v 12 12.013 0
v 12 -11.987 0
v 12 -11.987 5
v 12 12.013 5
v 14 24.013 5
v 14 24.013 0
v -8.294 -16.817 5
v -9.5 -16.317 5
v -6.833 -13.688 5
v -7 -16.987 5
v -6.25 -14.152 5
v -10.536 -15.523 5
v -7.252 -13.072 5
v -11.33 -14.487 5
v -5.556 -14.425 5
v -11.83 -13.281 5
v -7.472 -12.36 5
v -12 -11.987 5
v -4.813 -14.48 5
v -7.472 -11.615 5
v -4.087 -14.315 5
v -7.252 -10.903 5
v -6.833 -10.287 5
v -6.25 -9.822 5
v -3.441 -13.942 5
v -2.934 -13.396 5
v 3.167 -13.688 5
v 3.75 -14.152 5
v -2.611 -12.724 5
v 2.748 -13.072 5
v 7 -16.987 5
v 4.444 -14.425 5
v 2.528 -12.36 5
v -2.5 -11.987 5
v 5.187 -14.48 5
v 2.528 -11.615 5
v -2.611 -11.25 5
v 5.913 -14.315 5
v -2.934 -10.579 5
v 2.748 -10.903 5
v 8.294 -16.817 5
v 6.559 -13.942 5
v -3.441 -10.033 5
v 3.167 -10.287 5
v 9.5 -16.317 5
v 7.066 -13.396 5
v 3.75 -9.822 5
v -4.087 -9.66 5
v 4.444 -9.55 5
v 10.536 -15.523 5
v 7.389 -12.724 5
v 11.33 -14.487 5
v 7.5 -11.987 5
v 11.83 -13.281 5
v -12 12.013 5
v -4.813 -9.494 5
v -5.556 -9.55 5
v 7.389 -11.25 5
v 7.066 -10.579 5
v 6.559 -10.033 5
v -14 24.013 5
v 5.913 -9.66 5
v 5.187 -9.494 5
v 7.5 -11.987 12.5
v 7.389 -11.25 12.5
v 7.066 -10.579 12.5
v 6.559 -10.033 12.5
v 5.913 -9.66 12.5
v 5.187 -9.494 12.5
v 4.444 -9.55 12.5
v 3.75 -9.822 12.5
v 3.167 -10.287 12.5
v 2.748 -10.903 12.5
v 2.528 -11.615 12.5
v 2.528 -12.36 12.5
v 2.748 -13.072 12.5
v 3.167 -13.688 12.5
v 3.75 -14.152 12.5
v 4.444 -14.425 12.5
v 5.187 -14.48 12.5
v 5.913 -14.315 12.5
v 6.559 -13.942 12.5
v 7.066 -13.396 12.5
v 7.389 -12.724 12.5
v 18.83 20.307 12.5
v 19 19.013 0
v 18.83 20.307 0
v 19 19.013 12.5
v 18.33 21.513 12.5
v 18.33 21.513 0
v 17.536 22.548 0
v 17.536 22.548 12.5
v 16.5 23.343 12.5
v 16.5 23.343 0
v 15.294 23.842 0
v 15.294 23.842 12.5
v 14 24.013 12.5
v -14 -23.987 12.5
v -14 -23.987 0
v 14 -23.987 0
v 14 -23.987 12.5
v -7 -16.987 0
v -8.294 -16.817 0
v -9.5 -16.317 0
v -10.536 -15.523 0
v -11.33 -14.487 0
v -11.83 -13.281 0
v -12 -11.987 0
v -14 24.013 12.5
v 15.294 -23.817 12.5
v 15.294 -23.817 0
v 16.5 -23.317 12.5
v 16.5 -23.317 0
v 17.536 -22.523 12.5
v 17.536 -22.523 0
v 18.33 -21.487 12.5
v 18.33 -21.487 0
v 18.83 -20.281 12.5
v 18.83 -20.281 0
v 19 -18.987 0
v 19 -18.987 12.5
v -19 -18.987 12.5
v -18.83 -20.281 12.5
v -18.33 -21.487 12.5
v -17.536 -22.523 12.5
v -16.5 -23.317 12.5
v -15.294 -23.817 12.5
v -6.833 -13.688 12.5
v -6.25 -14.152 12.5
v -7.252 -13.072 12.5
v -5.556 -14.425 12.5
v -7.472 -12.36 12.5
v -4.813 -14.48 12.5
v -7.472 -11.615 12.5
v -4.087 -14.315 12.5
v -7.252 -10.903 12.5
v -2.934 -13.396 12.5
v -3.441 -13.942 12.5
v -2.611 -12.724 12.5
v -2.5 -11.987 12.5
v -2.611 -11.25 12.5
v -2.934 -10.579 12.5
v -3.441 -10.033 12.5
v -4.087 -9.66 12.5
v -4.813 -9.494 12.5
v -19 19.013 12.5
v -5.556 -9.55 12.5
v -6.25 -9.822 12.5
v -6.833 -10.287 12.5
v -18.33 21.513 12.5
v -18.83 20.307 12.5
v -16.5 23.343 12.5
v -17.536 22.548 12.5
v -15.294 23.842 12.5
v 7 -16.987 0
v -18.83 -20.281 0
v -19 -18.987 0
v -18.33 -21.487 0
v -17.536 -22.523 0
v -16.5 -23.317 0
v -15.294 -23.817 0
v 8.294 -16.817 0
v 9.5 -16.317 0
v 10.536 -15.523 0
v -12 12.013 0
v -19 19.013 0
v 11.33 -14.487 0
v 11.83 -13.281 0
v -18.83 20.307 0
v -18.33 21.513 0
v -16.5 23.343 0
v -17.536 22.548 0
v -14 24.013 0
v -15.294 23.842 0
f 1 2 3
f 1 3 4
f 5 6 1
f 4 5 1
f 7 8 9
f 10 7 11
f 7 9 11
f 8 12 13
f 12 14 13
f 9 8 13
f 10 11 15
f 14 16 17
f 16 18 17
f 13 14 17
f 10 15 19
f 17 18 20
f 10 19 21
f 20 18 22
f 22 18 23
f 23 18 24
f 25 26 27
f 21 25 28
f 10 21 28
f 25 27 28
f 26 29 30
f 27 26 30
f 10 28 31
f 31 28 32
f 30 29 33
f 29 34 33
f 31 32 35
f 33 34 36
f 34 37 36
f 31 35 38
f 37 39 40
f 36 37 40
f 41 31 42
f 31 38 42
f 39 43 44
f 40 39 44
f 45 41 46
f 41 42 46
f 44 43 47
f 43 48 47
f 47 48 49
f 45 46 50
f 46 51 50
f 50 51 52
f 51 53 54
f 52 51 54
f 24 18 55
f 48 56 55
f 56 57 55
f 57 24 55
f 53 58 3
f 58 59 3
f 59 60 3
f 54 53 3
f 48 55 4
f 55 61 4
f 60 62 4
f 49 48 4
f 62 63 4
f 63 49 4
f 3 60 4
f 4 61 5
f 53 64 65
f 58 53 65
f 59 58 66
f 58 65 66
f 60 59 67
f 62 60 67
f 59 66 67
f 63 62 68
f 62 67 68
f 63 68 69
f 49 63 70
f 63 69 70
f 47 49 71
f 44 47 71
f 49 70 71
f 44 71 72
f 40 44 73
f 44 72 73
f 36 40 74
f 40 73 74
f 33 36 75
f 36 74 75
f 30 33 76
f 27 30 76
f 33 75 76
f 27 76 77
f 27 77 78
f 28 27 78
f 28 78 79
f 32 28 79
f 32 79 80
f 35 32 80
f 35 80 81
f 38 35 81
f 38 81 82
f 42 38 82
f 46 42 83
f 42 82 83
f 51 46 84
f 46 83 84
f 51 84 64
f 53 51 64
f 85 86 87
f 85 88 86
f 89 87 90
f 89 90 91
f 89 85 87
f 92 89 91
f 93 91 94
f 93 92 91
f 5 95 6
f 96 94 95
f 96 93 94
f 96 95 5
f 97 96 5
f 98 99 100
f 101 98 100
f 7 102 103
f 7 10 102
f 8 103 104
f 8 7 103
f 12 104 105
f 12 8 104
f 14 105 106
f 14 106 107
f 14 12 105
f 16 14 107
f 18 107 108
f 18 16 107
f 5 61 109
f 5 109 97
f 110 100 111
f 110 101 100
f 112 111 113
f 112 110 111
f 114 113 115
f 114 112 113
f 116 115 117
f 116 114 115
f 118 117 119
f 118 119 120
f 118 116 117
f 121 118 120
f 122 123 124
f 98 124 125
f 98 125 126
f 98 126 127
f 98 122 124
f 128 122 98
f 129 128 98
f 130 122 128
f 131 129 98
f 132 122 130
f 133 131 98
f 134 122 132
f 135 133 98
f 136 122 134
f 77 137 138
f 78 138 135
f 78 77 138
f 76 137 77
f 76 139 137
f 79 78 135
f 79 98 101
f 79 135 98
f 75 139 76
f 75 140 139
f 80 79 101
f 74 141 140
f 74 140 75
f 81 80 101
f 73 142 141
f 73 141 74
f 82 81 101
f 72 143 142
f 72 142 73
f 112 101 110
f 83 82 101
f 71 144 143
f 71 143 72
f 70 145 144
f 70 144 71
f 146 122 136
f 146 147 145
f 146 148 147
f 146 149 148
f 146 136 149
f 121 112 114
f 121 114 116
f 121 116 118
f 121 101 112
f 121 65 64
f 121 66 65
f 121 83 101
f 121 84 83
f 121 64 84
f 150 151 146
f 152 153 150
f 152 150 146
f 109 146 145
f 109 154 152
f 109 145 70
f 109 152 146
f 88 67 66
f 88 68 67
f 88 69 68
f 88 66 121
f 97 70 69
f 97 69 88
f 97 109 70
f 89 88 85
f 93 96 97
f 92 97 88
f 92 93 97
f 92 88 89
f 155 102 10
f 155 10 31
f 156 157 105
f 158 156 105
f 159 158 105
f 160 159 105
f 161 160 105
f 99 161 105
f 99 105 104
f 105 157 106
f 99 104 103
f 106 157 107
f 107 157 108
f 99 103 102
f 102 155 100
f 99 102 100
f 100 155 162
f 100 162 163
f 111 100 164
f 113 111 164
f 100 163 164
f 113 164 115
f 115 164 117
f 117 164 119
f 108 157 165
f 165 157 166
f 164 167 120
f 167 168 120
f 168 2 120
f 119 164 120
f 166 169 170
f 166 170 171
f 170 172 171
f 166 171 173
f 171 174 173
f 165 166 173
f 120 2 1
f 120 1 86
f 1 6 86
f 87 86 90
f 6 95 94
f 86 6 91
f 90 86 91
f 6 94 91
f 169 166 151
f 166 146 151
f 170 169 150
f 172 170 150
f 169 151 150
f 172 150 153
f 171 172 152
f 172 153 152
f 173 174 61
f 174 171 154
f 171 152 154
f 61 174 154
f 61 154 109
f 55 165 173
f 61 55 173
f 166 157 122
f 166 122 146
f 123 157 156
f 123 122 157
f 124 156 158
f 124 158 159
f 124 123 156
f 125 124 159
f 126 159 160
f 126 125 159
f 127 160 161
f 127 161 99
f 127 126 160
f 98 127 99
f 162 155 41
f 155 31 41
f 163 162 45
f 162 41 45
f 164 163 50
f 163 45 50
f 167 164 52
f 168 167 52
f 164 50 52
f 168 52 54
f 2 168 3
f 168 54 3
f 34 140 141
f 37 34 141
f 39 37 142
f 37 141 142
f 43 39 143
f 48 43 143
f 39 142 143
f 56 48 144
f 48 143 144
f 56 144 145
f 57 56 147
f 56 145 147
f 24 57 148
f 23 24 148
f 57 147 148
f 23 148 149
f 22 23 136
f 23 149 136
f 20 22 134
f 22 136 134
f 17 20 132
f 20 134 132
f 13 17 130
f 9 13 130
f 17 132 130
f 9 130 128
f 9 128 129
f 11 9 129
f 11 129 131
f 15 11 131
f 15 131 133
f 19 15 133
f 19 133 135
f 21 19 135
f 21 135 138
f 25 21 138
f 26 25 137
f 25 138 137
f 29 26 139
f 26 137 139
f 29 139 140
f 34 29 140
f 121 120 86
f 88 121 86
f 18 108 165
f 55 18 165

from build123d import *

# Parameters (mm, degrees)
F0_W     = 38
F0_H     = 48
F0_W_2   = 24
F0_H_2   = 34
F1_DEPTH = 12.5
F2_R     = 5
F4_DEPTH = 5
F5_R     = 5
F3_R     = 2.5
F6_DEPTH = 7.5
F8_DEPTH = 5


with BuildPart() as f1:
    # F0 (on Top) → F1 (new body)
    with BuildSketch(Plane.XY):
        with Locations((0, 0.012681)):
            Rectangle(F0_W, F0_H)
        with Locations((0, 0.012681)):
            Rectangle(F0_W_2, F0_H_2, mode=Mode.SUBTRACT)
        with Locations((0, 0.012681)):
            Rectangle(F0_W_2, F0_H_2)
    extrude(amount=F1_DEPTH)

    # F2
    f2_edges = [f1.edges().sort_by_distance(p)[0] for p in [
        (-19, -23.987319, 6.25),
        (19, -23.987319, 6.25),
        (19, 24.012681, 6.25),
        (-19, 24.012681, 6.25),
    ]]
    fillet(f2_edges, radius=F2_R)

    # F0 (on Top) → F4 (cut)
    with BuildSketch(Plane.XY):
        with Locations((0, 0.012681)):
            Rectangle(F0_W_2, F0_H_2)
    extrude(amount=F4_DEPTH, mode=Mode.SUBTRACT)

    # F5
    f5_edges = [f1.edges().sort_by_distance(p)[0] for p in [
        (-12, -16.987319, 2.5),
        (12, -16.987319, 2.5),
        (12, 17.012681, 2.5),
        (-12, 17.012681, 2.5),
    ]]
    fillet(f5_edges, radius=F5_R)

    # F3 (on face) → F6 (cut, through all)
    with BuildSketch(Plane.XY.offset(12.5)):
        with Locations((-5, -11.987319)):
            Circle(F3_R)
        with Locations((5, -11.987319)):
            Circle(F3_R)
    extrude(amount=-F6_DEPTH, mode=Mode.SUBTRACT)

    # F7 (on face) → F8 (cut)
    with BuildSketch(Plane(origin=(0, 0, 0), x_dir=(1, 0, 0), z_dir=(0, 0, -1))):
        with BuildLine():
            Line((14, -24.012681), (12, -12.012681))
            ThreePointArc((12, -12.012681), (10.535534, -15.548215), (7, -17.012681))
            Line((7, -17.012681), (-7, -17.012681))
            ThreePointArc((-7, -17.012681), (-10.535534, -15.548215), (-12, -12.012681))
            Line((-12, -12.012681), (-14, -24.012681))
            Line((-14, -24.012681), (14, -24.012681))
        make_face()
    extrude(amount=-F8_DEPTH, mode=Mode.SUBTRACT)


solid = f1.part
